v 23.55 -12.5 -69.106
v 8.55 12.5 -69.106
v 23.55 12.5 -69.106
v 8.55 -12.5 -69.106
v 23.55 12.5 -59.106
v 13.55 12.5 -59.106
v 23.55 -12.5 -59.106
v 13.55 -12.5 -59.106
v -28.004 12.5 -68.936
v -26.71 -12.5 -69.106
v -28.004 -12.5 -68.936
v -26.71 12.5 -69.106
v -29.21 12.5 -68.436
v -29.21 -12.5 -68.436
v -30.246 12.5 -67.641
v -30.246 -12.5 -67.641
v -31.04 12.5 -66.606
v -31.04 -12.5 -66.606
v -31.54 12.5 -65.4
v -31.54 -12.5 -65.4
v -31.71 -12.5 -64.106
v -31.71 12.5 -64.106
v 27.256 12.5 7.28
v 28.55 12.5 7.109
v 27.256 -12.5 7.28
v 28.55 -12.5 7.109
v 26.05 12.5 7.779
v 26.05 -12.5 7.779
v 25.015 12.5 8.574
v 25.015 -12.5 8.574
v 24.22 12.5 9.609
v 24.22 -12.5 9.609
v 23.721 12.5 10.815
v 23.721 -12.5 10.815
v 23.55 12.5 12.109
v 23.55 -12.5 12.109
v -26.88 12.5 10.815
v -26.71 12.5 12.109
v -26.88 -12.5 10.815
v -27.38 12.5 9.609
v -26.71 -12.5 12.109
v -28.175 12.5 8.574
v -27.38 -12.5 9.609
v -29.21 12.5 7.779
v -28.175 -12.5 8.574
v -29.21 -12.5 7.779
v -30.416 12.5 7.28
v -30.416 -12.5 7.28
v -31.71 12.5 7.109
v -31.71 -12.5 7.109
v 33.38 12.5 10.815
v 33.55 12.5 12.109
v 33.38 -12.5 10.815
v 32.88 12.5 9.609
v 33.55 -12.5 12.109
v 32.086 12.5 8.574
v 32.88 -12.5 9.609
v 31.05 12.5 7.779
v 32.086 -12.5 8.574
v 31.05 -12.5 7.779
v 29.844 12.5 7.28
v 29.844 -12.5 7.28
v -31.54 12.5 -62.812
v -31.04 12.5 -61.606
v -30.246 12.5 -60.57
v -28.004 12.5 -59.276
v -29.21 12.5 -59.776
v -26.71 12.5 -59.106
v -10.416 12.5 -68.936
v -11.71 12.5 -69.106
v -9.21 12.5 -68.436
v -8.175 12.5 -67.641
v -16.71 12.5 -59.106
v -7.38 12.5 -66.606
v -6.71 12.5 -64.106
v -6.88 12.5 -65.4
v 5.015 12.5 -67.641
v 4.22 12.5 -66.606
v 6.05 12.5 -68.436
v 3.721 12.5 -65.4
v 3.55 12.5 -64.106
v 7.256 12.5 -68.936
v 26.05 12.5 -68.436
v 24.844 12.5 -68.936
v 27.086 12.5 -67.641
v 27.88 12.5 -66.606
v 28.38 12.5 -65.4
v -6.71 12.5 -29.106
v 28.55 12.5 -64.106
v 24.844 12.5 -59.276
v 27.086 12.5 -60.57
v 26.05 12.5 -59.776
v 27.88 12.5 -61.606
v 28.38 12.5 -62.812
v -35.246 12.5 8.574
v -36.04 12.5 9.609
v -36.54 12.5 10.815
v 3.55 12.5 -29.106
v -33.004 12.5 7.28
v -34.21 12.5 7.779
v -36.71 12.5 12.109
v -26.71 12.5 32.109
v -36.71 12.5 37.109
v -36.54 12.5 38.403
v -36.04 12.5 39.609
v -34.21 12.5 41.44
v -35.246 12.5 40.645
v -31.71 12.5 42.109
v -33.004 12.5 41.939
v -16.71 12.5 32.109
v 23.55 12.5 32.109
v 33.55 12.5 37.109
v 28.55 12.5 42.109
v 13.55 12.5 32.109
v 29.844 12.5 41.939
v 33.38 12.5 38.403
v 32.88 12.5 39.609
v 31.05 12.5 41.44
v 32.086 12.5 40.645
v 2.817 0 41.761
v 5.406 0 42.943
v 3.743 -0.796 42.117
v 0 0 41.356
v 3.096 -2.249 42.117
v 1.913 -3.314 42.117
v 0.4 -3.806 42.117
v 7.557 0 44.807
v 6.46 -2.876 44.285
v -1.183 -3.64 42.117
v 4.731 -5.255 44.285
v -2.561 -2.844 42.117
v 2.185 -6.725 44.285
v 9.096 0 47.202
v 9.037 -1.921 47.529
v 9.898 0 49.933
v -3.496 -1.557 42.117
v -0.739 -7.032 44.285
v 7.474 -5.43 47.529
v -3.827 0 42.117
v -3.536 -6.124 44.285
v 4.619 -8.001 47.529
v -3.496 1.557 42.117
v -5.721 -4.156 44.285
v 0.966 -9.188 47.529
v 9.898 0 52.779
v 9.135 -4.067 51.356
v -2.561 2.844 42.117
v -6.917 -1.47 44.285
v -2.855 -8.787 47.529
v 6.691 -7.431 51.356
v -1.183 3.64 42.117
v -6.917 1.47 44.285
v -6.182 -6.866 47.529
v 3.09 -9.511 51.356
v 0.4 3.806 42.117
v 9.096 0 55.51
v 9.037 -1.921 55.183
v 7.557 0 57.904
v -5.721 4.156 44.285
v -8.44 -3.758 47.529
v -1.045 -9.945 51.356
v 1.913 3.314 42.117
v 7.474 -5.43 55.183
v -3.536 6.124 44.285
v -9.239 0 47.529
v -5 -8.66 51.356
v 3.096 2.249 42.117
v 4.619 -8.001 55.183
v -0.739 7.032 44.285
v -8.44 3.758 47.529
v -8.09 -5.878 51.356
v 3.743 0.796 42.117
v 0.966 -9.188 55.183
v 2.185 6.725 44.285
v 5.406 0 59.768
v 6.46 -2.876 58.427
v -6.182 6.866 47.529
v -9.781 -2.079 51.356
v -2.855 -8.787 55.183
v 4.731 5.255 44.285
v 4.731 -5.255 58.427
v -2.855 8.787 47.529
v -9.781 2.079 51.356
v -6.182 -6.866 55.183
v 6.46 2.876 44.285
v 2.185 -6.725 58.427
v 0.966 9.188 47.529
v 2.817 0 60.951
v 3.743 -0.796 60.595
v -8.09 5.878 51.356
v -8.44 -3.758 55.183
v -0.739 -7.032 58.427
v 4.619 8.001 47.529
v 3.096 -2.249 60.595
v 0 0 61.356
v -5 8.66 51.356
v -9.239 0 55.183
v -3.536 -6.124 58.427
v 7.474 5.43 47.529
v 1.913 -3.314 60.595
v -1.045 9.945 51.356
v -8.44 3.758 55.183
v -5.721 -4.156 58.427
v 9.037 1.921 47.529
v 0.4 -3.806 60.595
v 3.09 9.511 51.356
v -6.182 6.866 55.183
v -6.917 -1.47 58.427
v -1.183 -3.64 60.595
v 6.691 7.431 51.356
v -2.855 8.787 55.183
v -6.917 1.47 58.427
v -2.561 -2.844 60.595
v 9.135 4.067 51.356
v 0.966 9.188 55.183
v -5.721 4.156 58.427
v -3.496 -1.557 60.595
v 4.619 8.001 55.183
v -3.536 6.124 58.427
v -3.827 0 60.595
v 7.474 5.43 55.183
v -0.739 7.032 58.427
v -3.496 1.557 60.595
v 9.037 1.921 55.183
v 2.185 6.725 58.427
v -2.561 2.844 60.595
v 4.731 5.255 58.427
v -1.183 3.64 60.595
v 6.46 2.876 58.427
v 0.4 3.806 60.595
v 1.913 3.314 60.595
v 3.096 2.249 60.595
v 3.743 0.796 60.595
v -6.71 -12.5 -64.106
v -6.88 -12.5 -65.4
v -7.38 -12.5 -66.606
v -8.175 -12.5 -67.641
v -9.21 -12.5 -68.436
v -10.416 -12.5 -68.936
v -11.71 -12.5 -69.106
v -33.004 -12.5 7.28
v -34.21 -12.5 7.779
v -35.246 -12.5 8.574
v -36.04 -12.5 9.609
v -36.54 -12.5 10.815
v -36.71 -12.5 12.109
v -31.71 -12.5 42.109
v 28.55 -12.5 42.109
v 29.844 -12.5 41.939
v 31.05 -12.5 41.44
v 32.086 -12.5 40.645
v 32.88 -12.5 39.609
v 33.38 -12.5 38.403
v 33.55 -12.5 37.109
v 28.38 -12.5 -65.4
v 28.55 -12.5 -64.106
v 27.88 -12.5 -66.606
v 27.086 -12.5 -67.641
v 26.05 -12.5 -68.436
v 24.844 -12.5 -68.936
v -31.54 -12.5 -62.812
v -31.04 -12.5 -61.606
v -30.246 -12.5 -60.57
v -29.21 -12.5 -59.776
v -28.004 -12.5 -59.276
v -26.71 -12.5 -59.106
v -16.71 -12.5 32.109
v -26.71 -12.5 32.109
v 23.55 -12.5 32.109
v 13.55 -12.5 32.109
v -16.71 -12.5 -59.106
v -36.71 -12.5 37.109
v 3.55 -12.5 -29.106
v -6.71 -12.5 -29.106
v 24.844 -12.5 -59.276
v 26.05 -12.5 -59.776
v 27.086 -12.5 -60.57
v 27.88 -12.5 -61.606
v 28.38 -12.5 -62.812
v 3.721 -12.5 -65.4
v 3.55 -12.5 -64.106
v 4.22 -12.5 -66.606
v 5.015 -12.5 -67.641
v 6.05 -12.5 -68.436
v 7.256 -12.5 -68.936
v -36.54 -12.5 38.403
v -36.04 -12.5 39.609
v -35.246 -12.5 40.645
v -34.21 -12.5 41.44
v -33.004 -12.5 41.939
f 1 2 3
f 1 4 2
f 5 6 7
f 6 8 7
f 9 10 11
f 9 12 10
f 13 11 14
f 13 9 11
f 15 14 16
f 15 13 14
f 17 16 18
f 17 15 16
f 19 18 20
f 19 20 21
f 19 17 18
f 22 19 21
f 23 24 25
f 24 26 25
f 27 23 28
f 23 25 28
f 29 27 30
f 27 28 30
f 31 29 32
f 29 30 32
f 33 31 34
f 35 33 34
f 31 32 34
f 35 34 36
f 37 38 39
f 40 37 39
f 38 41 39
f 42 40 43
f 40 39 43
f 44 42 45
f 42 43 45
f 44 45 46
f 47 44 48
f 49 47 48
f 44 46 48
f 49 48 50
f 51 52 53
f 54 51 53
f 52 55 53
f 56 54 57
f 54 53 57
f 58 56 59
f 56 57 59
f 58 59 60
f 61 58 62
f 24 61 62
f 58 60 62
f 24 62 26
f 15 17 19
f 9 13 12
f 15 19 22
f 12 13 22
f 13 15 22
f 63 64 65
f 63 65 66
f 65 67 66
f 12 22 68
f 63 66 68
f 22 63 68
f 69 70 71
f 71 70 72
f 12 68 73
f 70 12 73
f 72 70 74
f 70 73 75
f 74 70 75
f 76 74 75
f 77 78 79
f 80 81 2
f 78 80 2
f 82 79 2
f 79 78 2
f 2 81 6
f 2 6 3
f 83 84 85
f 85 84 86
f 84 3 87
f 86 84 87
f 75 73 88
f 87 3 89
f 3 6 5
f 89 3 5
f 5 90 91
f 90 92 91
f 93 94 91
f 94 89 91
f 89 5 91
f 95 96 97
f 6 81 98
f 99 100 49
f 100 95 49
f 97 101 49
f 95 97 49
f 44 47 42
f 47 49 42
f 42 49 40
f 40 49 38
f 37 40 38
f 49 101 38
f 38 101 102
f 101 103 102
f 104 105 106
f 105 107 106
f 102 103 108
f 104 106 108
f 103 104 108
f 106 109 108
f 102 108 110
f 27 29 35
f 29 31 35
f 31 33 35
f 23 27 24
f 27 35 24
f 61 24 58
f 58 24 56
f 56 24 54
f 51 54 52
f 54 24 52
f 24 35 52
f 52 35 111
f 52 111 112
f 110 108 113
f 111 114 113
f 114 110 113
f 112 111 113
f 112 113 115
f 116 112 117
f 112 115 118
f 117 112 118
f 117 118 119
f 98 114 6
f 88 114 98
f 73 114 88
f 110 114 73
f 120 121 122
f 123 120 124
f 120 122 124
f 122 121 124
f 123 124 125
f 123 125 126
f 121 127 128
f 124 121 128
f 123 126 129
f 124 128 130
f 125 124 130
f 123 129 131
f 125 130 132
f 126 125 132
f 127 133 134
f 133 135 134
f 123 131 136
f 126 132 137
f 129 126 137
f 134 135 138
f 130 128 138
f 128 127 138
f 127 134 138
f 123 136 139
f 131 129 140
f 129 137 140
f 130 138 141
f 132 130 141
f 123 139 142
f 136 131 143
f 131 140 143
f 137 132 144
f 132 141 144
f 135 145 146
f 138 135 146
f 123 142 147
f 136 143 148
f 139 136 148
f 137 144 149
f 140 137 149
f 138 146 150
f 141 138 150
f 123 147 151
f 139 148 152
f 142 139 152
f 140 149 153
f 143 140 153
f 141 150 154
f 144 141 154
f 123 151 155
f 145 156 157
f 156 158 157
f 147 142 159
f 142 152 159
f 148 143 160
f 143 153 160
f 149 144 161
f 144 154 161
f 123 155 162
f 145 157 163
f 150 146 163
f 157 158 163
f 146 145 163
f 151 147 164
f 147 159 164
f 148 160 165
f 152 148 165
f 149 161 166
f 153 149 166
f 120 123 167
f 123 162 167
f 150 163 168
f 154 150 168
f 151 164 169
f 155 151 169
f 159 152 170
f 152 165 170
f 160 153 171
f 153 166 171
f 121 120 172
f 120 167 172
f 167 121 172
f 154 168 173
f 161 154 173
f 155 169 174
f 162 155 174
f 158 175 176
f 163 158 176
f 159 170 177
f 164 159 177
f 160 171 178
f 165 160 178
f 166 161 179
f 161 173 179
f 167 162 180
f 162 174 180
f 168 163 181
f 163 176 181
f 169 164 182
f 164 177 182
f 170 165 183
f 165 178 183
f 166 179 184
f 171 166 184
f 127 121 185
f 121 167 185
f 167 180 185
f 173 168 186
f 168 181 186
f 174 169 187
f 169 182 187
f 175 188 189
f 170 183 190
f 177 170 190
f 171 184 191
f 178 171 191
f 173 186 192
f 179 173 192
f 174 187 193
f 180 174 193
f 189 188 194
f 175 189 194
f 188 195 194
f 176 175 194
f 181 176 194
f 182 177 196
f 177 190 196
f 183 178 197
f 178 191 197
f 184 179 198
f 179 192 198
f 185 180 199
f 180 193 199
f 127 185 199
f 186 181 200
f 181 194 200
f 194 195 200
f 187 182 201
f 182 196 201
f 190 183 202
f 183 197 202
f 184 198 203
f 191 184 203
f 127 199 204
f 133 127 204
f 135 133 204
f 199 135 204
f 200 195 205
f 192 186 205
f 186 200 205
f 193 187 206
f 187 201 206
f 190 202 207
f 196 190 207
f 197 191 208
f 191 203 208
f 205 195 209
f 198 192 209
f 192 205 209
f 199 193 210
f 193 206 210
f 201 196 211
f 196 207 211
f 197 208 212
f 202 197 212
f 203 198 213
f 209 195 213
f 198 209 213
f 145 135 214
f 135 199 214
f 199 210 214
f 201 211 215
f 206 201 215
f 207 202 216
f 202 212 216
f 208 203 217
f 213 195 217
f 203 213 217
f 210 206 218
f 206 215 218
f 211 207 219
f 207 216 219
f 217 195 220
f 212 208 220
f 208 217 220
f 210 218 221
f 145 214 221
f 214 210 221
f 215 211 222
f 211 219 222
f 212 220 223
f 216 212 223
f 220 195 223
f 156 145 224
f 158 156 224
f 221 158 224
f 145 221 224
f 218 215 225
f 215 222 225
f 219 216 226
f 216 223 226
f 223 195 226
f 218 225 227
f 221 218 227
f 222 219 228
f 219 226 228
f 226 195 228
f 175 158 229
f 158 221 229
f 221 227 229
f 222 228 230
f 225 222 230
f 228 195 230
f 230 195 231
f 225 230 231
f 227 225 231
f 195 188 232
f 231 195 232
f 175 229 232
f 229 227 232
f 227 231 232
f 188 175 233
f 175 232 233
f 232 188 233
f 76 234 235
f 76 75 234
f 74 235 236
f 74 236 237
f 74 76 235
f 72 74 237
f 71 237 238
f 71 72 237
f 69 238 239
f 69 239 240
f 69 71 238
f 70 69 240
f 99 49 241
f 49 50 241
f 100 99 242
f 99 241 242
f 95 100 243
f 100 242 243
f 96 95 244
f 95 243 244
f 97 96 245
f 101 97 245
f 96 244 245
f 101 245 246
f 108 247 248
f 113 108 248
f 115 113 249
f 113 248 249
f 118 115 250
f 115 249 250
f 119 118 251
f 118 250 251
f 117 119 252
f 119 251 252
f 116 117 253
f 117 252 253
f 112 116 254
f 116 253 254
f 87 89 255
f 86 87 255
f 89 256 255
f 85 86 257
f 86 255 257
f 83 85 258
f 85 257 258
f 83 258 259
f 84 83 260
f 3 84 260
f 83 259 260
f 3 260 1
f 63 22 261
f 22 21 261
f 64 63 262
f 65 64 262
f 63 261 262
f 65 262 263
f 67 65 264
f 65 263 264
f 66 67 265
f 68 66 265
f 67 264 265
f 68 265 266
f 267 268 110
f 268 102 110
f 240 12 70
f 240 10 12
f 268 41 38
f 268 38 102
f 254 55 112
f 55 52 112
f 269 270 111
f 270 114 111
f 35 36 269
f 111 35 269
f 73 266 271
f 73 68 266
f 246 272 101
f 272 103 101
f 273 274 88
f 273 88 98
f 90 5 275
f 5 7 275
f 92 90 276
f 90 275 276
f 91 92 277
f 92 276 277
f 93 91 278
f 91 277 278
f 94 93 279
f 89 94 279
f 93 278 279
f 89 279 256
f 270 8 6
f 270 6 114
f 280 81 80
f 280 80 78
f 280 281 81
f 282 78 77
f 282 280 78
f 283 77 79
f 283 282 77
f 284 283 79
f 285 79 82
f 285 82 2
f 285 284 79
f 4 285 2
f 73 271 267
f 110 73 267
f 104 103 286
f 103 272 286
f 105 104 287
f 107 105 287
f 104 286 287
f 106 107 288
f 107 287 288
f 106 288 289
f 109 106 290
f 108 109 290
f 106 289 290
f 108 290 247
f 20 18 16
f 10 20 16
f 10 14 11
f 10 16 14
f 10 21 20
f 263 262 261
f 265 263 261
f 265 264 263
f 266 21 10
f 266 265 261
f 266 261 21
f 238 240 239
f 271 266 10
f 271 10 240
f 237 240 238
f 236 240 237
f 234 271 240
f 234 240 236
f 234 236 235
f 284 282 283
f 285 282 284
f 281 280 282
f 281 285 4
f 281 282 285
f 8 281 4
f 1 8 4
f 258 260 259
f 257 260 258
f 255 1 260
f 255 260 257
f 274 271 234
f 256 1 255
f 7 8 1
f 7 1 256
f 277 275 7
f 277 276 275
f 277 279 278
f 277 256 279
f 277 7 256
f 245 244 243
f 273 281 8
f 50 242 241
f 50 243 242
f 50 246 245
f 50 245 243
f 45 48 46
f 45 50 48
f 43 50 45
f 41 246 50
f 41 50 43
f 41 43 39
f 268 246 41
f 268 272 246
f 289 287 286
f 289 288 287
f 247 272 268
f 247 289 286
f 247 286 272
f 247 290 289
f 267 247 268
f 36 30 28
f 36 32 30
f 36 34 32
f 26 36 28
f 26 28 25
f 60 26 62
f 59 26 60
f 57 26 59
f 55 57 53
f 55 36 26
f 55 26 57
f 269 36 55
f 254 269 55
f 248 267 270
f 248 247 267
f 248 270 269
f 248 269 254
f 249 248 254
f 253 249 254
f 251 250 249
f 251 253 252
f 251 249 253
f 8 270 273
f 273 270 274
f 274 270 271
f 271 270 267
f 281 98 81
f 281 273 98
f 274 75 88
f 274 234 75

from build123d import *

# Parameters (mm, degrees)
F0_W          = 30.2604204044
F0_H          = 71.2152794003
F1_DEPTH      = 12.5
F1_DEPTH_BACK = 12.5
F4_W          = 15
F4_H          = 10
F4_W_2        = 10
F4_H_2        = 25
F5_DEPTH      = 12.5
F5_DEPTH_BACK = 12.5
F6_R          = 4.99999


# Not quite as in the source:
# - a fillet or chamfer is up to 0.001 mm smaller than in the source, because OpenCascade refuses the exact size


with BuildPart() as f1:
    # F0 (on Front) → F1 (new body, two sides)
    with BuildSketch(Plane.XZ) as f1_sk:
        with Locations((-1.579860691, 6.5017342567)):
            Rectangle(F0_W, F0_H)
    extrude(amount=F1_DEPTH)
    extrude(f1_sk.sketch, amount=-F1_DEPTH_BACK)

    # F4 (on Front) → F5 (join, two sides)
    with BuildSketch(Plane.XZ) as f5_sk:
        Polygon((13.5503495112, -29.1059054434), (3.5503495112, -29.1059054434), (3.5503495112, -69.1059054434), (13.5503495112, -69.1059054434), (13.5503495112, -59.1059054434), align=None)
        with Locations((21.0503495112, -64.1059054434)):
            Rectangle(F4_W, F4_H)
        Polygon((-6.7100708932, -69.1059054434), (-6.7100708932, -29.1059054434), (-16.7100708932, -29.1059054434), (-16.7100708932, -59.1059054434), (-16.7100708932, -69.1059054434), align=None)
        with Locations((-24.2100708932, -64.1059054434)):
            Rectangle(F4_W, F4_H)
        Polygon((-16.7100708932, 32.1093739569), (-16.7100708932, 42.1093739569), (-36.7100708932, 42.1093739569), (-36.7100708932, 32.1093739569), (-26.7100708932, 32.1093739569), align=None)
        with Locations((-31.7100708932, 19.6093739569)):
            Rectangle(F4_W_2, F4_H_2)
        Polygon((33.5503495112, 42.1093739569), (13.5503495112, 42.1093739569), (13.5503495112, 32.1093739569), (23.5503495112, 32.1093739569), (33.5503495112, 32.1093739569), align=None)
        with Locations((28.5503495112, 19.6093739569)):
            Rectangle(F4_W_2, F4_H_2)
    extrude(amount=F5_DEPTH)
    extrude(f5_sk.sketch, amount=-F5_DEPTH_BACK)

    # F6 (radius 5 in the source; OpenCascade refuses exactly that, so slightly less here)
    f6_edges = [f1.edges().sort_by_distance(p)[0] for p in [
        (-36.710071, 0, 42.109374),
        (33.55035, 0, 42.109374),
        (-6.710071, 0, -69.105905),
        (3.55035, 0, -69.105905),
        (-36.710071, 0, 7.109374),
        (23.55035, 0, 7.109374),
        (-31.710071, 0, -69.105905),
        (-31.710071, 0, -59.105905),
        (-26.710071, 0, 7.109374),
        (33.55035, 0, 7.109374),
        (28.55035, 0, -59.105905),
        (28.55035, 0, -69.105905),
    ]]
    fillet(f6_edges, radius=F6_R)


with BuildPart() as f3:
    # F2 (on Front) → F3 (revolve)
    with BuildSketch(Plane.XZ):
        with BuildLine():
            ThreePointArc((0, 41.3558275998), (10, 51.3558275998), (0, 61.3558275998))
            Line((0, 61.3558275998), (0, 41.3558275998))
        make_face()
    revolve(axis=Axis((0, 0, 51.3558275998), (0, 0, -1)))


solid = Compound([f1.part, f3.part])
